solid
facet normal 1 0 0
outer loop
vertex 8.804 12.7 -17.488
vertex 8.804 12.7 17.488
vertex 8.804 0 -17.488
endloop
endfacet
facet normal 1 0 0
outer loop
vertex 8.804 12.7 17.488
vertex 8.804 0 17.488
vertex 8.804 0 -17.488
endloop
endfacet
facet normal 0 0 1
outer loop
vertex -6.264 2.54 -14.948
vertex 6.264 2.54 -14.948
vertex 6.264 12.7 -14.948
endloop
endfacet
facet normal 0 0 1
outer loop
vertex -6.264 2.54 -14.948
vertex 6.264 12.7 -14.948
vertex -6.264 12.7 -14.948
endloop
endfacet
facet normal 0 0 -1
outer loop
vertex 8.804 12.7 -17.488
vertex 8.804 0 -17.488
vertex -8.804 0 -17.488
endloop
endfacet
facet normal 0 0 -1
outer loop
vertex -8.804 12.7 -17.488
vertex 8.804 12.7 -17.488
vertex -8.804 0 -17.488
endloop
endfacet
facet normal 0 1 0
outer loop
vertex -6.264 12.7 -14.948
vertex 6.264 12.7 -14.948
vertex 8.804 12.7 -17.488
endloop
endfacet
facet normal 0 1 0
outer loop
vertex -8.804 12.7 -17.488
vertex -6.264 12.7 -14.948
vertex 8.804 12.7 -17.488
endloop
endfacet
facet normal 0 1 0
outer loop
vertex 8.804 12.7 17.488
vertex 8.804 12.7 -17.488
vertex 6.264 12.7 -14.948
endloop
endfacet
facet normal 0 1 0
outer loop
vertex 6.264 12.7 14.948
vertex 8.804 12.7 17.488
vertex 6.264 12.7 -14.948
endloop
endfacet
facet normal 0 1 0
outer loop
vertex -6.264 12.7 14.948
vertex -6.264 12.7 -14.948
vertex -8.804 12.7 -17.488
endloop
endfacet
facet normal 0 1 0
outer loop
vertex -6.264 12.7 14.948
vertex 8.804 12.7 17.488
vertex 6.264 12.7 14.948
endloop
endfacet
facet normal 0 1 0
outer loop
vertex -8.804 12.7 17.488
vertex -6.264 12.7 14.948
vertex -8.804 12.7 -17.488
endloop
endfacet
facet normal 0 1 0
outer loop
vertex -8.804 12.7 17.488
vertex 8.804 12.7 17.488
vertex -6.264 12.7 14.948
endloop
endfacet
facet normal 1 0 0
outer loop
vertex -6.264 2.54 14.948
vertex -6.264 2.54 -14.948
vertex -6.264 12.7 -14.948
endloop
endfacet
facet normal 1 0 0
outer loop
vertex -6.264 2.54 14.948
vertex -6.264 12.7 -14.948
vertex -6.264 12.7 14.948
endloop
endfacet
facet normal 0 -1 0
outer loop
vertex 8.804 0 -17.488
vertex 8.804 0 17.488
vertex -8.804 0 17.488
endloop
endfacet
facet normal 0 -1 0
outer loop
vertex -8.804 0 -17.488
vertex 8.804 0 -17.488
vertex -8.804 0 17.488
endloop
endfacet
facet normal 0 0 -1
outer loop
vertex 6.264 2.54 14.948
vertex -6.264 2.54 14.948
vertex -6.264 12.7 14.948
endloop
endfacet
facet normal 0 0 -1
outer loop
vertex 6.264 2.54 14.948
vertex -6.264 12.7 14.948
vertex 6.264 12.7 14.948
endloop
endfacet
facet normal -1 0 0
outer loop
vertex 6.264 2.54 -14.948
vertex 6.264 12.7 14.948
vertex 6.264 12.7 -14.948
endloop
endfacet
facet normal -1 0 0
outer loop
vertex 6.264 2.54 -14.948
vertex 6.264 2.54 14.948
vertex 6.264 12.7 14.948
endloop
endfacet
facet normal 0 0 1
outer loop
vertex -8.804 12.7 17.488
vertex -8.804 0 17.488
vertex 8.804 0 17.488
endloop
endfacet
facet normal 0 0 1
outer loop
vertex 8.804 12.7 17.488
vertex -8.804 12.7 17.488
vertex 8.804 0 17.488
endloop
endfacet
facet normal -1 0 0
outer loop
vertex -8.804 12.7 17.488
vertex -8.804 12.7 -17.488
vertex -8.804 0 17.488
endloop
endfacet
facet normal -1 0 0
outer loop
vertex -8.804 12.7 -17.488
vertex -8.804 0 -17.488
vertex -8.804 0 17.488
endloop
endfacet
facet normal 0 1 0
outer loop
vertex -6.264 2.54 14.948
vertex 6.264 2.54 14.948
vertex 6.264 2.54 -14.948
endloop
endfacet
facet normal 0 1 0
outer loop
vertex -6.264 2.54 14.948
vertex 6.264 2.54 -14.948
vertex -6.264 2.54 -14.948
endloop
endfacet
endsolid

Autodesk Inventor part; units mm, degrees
ref_plane "YZ Plane" through (0, 0, 0) normal (1, 0, 0) x (0, 1, 0)
ref_plane "XZ Plane" through (0, 0, 0) normal (0, 1, 0) x (-1, 0, 0)
ref_plane "XY Plane" through (0, 0, 0) normal (0, 0, 1) x (1, 0, 0)
sketch "Sketch1" plane through (0, 0, 0) normal (0, 1, 0) x (-1, 0, 0)
  line L0 (8.8039, 17.4877) -> (-8.8039, 17.4877)
  line L1 (-8.8039, 17.4877) -> (-8.8039, -17.4877)
  line L2 (-8.8039, -17.4877) -> (8.8039, -17.4877)
  line L3 (8.8039, -17.4877) -> (8.8039, 17.4877)
  line L4 (8.8039, 17.4877) -> (-8.8039, -17.4877) construction
  line L5 (-8.8039, 17.4877) -> (8.8039, -17.4877) construction
  point P0 (0, 0)
extrude "Extrusion1" add sketch "Sketch1" along normal blind 12.7
shell "Shell1" thickness 2.54 removed faces 1 at (2.9346, 12.7, 5.8292)
properties part number "BOX"
